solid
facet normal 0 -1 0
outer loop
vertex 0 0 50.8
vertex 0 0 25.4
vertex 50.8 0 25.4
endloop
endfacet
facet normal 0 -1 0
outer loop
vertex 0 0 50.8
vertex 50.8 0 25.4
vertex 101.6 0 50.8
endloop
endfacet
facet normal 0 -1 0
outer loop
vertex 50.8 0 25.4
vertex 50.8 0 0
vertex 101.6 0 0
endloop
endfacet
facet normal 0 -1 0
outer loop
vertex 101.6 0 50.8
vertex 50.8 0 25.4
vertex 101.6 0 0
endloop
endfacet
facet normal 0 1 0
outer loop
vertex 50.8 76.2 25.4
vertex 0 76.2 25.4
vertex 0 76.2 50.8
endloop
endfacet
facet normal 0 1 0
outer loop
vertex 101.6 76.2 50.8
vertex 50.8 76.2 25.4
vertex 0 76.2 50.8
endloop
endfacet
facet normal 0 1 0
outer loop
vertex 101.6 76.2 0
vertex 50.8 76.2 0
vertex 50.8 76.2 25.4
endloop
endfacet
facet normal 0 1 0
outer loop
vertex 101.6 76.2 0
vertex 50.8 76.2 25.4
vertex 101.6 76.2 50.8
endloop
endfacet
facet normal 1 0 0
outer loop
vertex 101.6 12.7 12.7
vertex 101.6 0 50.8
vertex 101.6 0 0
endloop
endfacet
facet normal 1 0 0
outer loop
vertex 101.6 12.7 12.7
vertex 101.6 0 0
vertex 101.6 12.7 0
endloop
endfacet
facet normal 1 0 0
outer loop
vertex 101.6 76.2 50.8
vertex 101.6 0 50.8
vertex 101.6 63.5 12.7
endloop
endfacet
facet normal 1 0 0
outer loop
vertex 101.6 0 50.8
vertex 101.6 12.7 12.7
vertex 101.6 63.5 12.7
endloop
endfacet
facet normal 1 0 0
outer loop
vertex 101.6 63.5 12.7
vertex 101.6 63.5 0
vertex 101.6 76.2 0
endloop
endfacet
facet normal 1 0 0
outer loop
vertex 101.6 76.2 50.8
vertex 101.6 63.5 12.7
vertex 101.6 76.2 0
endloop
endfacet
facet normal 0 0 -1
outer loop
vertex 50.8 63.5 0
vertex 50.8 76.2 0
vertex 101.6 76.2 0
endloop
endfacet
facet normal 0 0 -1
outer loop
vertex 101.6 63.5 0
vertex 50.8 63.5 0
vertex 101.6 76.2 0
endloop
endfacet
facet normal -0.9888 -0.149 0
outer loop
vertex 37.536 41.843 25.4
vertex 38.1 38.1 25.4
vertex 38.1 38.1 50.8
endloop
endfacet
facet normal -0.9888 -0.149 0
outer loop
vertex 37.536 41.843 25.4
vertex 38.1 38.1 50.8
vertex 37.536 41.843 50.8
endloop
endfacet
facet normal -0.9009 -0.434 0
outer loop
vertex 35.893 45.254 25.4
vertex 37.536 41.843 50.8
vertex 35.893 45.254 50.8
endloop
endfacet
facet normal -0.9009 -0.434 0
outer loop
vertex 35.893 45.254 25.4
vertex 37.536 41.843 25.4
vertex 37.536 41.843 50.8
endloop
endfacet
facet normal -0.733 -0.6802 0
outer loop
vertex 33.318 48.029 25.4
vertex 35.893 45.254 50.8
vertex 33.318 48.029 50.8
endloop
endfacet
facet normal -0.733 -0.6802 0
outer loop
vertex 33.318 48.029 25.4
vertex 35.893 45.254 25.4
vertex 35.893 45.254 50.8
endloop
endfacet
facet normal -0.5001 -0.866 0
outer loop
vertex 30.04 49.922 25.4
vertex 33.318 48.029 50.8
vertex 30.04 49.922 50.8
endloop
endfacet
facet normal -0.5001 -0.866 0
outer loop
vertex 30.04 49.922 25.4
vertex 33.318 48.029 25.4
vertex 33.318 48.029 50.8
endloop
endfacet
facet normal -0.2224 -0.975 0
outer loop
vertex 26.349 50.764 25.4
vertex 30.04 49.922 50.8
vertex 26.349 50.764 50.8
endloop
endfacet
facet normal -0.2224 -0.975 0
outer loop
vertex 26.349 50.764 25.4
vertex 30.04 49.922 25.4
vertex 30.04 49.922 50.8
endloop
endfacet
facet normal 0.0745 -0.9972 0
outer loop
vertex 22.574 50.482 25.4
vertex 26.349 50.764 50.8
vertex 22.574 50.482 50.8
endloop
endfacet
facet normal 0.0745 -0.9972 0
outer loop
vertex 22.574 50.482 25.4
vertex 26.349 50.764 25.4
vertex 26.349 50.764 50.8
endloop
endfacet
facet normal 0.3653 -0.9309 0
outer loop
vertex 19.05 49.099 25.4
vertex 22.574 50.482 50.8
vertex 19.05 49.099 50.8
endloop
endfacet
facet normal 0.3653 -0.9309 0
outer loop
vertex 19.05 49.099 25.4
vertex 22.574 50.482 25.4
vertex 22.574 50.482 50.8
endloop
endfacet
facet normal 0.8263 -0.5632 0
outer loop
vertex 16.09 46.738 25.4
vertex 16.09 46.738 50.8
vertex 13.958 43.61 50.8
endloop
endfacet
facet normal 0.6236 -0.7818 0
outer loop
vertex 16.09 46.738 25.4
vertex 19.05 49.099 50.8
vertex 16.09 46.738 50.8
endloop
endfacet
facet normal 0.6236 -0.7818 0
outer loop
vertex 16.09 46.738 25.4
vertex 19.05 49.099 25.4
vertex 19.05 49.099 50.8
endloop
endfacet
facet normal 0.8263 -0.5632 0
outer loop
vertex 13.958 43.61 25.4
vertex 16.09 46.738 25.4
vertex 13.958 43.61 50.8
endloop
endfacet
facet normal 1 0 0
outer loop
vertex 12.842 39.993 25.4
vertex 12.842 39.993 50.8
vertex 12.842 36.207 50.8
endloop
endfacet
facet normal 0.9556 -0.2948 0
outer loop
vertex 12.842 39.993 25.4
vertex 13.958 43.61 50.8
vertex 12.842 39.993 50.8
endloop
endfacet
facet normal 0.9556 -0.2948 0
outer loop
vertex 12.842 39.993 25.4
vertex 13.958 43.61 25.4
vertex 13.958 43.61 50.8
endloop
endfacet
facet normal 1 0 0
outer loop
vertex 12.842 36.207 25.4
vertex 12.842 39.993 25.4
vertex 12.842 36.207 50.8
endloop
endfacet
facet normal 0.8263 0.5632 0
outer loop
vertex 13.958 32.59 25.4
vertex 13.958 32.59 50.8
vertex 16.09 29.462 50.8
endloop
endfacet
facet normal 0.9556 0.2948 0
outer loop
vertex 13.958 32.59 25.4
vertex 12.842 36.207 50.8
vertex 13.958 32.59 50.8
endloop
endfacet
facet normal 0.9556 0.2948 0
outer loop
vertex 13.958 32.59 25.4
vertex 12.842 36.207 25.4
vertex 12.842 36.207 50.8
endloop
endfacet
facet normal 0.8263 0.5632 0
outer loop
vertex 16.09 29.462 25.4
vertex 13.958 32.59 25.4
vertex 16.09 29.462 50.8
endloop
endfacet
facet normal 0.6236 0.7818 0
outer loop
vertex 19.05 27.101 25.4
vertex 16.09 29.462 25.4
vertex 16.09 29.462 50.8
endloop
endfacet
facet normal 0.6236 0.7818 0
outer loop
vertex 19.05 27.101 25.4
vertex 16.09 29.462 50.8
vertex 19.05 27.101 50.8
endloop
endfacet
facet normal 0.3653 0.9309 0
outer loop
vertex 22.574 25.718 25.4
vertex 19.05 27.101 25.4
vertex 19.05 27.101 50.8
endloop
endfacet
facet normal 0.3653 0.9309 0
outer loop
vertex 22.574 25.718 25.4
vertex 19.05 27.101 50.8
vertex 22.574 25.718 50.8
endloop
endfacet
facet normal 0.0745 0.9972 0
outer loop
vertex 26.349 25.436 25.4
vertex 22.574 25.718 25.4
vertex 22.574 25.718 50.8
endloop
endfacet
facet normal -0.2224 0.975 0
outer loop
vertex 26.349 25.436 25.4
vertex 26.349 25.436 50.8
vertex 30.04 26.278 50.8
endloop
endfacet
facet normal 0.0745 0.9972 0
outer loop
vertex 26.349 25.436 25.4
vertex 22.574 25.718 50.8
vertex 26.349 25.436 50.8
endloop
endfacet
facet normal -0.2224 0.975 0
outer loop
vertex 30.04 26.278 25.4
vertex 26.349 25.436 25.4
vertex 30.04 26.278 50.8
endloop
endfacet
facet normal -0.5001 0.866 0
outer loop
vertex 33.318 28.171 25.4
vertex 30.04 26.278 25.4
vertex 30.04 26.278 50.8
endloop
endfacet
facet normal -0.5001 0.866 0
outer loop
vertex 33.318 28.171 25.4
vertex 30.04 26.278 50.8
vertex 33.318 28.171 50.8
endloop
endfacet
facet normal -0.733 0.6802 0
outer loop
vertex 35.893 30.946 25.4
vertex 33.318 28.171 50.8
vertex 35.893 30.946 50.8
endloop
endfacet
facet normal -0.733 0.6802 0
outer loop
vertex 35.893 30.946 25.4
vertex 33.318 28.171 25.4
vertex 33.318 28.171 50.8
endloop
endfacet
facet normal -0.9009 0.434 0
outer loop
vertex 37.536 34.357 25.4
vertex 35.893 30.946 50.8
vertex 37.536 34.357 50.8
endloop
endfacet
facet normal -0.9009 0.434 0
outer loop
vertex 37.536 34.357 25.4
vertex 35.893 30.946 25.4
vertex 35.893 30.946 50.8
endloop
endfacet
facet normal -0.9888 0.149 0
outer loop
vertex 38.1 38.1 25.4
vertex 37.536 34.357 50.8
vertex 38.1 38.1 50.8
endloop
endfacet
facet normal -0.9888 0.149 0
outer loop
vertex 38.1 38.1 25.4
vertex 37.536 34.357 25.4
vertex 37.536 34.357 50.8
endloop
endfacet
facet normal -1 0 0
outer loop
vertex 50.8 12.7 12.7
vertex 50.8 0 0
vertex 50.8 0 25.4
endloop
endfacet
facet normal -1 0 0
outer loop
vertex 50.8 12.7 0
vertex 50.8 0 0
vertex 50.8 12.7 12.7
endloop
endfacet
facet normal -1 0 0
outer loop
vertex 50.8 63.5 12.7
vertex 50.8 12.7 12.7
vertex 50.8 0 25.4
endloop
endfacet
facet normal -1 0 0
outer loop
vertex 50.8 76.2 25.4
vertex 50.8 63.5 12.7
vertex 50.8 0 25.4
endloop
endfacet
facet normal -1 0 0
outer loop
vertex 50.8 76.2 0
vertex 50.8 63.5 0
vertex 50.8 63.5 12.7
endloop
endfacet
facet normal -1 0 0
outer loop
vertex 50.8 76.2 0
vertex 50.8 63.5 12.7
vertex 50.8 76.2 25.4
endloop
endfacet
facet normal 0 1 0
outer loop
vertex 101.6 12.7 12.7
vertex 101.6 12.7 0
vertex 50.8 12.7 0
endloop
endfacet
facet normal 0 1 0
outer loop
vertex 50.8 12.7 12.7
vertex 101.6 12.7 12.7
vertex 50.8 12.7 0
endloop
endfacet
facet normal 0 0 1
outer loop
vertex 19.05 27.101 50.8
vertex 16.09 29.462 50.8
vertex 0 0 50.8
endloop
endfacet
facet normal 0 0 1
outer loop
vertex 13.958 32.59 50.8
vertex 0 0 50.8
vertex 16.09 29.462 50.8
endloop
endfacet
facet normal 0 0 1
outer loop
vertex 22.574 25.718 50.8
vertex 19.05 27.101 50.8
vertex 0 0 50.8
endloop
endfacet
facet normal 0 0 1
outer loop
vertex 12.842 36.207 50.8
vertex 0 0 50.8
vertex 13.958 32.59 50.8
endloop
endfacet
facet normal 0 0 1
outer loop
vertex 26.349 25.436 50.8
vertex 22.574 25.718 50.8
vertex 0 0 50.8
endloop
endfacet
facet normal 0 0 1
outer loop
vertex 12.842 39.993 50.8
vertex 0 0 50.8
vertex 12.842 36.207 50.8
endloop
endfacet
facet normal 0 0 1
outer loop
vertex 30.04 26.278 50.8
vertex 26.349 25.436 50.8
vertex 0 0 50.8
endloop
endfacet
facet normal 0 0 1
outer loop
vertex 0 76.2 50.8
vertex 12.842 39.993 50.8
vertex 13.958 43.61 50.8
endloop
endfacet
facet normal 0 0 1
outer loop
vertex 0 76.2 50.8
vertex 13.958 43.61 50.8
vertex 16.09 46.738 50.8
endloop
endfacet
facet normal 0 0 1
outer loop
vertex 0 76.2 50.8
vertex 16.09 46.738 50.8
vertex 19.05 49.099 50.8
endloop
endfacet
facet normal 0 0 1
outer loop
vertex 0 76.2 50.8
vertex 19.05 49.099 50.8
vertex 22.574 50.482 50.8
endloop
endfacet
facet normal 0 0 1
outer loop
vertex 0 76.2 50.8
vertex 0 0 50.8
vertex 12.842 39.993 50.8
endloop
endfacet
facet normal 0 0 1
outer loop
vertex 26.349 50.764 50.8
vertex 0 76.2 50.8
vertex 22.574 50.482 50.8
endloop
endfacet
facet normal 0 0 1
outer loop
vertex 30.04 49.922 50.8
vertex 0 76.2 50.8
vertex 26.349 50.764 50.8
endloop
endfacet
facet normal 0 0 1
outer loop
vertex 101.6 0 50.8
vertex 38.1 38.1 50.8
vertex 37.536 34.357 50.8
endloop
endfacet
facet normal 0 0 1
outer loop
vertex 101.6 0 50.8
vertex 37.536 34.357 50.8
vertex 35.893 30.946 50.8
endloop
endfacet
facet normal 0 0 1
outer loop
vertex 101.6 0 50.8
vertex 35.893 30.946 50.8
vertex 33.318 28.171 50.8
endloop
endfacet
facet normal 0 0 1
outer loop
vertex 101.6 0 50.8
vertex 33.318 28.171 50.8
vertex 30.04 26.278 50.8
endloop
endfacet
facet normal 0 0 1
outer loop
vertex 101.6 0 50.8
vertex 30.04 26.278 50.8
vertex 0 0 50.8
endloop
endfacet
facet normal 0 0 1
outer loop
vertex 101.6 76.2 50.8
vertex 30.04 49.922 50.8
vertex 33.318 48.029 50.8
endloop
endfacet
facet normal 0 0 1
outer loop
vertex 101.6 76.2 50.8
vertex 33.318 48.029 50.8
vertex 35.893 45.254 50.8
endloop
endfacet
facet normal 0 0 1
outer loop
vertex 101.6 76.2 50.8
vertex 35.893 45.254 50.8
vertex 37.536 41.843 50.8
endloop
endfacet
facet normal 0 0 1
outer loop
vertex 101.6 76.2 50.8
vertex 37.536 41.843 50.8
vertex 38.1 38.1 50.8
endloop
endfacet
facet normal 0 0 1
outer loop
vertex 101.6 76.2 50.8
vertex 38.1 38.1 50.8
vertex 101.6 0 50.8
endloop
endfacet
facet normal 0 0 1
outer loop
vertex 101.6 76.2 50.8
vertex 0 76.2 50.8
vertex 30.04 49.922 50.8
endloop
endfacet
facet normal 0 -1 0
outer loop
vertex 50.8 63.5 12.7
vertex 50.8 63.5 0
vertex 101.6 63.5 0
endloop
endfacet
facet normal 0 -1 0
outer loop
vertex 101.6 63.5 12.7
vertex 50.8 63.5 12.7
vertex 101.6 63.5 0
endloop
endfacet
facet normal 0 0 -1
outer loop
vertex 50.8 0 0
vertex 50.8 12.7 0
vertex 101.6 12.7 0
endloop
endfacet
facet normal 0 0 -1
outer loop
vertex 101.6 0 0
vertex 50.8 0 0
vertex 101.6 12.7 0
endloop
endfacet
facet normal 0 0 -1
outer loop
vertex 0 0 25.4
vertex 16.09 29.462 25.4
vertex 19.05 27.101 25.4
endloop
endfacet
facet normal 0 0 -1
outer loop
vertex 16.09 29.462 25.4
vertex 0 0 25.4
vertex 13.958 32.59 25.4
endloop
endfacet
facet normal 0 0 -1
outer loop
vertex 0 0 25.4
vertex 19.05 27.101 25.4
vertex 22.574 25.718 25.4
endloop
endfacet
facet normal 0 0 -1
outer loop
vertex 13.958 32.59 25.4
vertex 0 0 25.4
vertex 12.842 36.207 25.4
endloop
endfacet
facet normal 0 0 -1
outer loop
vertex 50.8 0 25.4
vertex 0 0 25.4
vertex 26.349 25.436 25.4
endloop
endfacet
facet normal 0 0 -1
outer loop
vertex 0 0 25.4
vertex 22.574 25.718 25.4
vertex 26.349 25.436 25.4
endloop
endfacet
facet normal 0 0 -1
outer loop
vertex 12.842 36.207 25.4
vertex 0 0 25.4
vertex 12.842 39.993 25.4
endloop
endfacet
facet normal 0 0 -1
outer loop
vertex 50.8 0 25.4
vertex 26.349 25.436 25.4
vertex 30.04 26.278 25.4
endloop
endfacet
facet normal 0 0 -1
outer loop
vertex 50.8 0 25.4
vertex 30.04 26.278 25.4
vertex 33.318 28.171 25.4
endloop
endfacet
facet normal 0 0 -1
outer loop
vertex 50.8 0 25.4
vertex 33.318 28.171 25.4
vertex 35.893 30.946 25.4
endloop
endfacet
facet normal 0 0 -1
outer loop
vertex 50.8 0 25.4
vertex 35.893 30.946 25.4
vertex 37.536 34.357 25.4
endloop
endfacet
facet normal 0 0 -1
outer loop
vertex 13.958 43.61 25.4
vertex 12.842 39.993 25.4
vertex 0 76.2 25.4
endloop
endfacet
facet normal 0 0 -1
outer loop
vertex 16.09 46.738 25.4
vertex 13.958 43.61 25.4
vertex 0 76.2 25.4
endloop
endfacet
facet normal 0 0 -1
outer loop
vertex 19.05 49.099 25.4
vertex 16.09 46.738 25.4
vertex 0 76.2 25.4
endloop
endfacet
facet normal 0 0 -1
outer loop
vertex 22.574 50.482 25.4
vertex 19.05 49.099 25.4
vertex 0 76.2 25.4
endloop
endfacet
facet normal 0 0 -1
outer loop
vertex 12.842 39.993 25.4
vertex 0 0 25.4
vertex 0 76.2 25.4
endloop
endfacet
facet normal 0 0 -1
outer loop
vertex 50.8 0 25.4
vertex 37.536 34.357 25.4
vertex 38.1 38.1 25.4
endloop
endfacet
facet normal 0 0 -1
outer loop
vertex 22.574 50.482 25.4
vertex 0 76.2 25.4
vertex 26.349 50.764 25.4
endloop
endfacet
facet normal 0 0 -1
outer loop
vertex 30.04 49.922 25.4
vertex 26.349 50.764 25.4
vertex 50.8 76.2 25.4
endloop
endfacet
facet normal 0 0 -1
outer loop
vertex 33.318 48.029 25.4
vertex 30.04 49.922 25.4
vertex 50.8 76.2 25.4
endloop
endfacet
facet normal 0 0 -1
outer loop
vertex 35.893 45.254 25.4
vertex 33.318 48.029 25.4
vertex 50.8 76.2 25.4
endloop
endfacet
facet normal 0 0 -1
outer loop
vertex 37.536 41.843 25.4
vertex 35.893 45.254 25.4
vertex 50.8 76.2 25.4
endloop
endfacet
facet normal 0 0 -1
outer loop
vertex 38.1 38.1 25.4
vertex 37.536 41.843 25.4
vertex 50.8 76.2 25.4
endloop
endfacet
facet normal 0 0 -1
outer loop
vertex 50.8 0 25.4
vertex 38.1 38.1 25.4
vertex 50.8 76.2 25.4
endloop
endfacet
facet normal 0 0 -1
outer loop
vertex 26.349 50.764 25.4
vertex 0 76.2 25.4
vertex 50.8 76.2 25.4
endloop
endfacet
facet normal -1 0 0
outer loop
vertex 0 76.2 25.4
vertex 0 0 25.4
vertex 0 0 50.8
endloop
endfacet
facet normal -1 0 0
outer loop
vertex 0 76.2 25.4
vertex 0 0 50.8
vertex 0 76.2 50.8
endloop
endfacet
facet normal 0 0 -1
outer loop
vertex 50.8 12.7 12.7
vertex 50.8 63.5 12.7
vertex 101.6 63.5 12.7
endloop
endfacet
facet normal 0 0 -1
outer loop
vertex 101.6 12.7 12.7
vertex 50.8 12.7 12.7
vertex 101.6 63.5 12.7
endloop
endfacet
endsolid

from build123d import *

# Parameters (mm, degrees)
F5_W      = 101.6
F5_H      = 76.2
F6_DEPTH  = 50.8
F7_W      = 50.8
F7_H      = 76.2
F8_DEPTH  = 25.4
F9_R      = 12.7
F10_DEPTH = 76.2
F12_DEPTH = 12.7


with BuildPart() as f6:
    # F5 (on Top) → F6 (new body)
    with BuildSketch(Plane.XY):
        with Locations((50.8, 38.1)):
            Rectangle(F5_W, F5_H)
    extrude(amount=F6_DEPTH)

    # F7 (on Top) → F8 (cut)
    with BuildSketch(Plane.XY):
        with Locations((25.4, 38.1)):
            Rectangle(F7_W, F7_H)
    extrude(amount=F8_DEPTH, mode=Mode.SUBTRACT)

    # F9 (on Top) → F10 (cut)
    with BuildSketch(Plane.XY):
        with Locations((25.4, 38.1)):
            Circle(F9_R)
    extrude(amount=F10_DEPTH, mode=Mode.SUBTRACT)

    # F11 (on face) → F12 (cut)
    with BuildSketch(Plane(origin=(0, 0, 0), x_dir=(1, 0, 0), z_dir=(0, 0, -1))):
        Polygon((101.6, -12.7), (83.254352, -12.7), (50.8, -12.7), (50.8, -63.5), (101.6, -63.5), align=None)
    extrude(amount=-F12_DEPTH, mode=Mode.SUBTRACT)


solid = f6.part
